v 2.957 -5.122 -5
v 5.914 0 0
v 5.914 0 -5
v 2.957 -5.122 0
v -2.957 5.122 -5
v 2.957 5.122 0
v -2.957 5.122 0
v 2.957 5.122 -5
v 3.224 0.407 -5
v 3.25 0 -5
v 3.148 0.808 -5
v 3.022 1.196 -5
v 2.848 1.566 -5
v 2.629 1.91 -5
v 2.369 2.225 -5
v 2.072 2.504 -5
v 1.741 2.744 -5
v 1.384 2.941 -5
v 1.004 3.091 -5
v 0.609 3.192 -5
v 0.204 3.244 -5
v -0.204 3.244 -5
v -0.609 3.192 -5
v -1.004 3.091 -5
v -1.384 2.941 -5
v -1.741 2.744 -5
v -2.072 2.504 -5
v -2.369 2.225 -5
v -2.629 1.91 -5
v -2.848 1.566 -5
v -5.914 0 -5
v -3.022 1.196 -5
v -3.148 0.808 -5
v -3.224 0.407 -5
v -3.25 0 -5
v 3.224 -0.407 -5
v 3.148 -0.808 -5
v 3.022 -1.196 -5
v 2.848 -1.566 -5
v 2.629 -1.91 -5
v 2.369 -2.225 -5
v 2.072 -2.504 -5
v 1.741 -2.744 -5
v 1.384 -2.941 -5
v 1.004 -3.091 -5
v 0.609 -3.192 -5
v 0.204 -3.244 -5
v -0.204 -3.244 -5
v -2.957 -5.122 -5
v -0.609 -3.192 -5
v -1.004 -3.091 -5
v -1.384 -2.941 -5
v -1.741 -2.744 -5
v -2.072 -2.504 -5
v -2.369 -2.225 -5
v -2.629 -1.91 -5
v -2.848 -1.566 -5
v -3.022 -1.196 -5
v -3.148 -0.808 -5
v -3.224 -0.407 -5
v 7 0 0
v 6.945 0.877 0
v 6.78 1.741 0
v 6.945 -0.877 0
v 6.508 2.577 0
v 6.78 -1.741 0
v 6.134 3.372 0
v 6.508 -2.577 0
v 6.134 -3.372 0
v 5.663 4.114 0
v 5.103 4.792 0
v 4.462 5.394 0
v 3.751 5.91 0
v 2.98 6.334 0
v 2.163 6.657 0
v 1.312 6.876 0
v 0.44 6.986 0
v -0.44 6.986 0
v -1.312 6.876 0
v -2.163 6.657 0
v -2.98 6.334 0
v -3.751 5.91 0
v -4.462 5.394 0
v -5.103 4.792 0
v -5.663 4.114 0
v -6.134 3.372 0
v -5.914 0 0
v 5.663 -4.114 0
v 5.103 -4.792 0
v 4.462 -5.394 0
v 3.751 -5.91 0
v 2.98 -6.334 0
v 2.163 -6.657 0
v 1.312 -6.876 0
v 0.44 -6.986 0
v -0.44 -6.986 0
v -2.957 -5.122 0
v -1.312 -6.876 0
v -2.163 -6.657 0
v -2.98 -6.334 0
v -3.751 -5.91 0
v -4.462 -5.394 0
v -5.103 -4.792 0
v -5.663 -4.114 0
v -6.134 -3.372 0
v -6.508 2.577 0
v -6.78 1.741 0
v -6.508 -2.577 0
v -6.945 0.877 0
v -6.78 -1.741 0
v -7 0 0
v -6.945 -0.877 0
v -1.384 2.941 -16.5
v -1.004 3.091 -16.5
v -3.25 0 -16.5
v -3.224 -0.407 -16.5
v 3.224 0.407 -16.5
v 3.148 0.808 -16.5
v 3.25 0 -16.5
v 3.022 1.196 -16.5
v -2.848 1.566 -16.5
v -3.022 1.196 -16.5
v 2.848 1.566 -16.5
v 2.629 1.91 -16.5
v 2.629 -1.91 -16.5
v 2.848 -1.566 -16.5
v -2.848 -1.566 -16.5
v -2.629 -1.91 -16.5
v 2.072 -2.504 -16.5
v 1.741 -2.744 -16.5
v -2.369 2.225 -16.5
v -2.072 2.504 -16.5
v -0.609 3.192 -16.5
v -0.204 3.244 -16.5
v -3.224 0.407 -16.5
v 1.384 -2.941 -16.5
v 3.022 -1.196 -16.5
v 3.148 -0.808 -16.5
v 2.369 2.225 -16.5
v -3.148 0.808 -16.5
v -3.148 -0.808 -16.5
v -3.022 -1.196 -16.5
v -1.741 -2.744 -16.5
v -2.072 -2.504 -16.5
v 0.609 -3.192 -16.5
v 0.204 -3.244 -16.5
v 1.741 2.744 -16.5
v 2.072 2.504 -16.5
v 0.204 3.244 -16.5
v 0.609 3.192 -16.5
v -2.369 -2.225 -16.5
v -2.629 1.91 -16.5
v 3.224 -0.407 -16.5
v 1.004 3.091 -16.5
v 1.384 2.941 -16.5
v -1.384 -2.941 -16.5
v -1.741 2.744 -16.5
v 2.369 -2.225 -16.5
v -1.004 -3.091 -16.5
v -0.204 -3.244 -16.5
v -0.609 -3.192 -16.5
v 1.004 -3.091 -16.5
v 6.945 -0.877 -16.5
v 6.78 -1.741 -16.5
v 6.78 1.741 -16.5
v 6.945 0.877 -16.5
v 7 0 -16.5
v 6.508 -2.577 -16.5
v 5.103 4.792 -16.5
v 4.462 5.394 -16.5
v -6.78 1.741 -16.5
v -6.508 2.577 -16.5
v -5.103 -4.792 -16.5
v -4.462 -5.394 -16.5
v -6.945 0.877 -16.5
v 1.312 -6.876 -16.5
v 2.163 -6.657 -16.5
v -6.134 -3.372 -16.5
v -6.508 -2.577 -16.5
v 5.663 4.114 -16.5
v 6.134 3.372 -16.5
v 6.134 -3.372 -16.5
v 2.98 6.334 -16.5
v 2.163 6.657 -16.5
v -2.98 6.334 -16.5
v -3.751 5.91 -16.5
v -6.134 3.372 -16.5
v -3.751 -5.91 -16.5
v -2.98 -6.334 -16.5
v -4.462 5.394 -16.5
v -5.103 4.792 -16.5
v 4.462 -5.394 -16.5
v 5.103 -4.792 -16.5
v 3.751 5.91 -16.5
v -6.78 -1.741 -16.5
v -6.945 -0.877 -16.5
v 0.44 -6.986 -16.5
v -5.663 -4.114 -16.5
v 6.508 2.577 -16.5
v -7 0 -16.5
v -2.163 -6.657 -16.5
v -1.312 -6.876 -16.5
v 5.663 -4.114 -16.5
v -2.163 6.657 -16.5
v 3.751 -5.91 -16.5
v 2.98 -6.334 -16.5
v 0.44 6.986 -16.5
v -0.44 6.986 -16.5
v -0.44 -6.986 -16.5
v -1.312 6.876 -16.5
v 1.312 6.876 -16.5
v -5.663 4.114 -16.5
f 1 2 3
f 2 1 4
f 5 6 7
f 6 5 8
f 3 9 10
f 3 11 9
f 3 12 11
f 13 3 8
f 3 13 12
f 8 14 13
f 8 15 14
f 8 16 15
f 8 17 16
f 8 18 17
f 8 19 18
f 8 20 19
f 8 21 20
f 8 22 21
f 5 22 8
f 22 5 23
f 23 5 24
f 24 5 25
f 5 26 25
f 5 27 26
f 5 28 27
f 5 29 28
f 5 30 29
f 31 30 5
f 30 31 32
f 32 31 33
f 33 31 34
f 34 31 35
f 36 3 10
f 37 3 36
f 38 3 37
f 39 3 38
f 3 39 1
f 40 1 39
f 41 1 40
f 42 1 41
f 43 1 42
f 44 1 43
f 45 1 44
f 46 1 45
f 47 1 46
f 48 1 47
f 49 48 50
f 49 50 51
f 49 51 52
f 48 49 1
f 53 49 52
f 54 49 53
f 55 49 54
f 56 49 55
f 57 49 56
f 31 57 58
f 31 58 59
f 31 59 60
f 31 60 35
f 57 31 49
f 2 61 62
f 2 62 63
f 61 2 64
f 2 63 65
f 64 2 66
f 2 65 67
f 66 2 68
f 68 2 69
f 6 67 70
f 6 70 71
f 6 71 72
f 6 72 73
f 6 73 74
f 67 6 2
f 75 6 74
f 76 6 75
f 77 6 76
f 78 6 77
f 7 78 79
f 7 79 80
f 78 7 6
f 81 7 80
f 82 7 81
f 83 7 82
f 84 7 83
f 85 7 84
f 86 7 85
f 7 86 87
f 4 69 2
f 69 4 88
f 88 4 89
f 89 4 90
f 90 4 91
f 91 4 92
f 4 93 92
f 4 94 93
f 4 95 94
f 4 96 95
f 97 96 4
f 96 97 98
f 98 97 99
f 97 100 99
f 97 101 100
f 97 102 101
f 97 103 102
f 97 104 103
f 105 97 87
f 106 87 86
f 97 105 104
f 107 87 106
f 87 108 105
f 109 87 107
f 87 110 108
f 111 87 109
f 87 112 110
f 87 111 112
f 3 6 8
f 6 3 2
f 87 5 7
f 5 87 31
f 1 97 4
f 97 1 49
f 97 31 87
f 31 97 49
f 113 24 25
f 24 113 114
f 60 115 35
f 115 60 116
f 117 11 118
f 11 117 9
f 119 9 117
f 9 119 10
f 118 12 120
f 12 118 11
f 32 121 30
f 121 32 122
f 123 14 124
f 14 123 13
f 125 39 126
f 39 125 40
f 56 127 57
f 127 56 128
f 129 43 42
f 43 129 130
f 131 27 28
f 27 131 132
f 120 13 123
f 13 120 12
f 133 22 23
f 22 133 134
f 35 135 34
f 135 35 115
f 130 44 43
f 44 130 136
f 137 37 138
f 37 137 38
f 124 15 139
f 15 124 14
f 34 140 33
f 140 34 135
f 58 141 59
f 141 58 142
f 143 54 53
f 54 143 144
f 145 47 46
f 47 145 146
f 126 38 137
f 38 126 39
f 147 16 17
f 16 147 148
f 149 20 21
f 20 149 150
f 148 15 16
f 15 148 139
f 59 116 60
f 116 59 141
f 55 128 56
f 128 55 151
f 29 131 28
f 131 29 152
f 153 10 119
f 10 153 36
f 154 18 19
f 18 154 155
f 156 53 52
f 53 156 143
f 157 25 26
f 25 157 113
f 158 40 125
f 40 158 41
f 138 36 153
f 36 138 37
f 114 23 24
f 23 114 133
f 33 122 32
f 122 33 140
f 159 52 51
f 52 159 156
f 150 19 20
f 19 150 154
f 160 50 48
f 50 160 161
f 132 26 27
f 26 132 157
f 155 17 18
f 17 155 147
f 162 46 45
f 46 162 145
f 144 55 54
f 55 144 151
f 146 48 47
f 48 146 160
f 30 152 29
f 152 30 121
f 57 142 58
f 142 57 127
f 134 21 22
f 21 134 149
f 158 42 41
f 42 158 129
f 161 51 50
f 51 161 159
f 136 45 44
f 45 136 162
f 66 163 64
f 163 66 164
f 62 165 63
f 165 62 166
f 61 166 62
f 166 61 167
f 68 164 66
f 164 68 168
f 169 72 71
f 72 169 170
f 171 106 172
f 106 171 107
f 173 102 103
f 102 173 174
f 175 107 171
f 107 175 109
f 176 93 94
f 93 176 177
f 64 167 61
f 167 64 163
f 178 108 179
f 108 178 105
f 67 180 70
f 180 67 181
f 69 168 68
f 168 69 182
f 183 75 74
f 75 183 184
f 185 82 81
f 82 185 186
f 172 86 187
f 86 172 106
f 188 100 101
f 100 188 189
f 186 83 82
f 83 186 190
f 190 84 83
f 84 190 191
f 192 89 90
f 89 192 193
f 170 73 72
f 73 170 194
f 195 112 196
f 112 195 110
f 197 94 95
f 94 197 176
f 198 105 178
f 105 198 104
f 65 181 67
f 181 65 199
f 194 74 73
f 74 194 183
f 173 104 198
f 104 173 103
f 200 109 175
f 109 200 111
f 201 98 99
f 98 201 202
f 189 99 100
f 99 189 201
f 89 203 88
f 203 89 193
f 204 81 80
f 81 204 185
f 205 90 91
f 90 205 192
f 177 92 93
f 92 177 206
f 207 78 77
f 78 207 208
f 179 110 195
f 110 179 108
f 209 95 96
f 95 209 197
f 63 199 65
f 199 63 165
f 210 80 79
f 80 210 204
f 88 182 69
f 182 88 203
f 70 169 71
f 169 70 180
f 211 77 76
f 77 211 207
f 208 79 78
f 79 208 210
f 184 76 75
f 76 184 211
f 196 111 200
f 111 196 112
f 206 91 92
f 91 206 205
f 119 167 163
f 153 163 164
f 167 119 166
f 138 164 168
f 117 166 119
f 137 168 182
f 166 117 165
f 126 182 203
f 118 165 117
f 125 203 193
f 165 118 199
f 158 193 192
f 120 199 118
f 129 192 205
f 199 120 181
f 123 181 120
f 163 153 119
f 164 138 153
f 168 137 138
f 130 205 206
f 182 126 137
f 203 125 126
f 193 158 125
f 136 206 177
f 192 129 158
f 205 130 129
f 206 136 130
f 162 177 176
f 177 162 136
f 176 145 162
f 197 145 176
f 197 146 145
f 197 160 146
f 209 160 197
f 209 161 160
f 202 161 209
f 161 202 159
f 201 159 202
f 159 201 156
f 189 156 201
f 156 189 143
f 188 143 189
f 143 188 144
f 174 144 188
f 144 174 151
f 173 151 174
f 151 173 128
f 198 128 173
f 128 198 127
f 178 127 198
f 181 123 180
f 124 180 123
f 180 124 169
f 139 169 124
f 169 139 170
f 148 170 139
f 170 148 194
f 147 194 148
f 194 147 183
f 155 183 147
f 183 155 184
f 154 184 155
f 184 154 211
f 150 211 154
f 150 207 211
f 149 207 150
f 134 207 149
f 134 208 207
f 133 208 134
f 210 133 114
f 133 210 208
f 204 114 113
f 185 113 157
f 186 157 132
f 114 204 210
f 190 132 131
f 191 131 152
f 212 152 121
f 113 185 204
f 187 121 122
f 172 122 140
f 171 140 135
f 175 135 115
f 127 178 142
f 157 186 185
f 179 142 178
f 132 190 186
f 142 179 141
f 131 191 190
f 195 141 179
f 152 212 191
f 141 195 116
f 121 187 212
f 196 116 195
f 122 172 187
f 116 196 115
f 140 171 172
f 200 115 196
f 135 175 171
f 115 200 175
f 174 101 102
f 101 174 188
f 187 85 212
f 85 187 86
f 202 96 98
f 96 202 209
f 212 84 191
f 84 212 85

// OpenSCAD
$fn = 50;


difference() {
	union() {
		translate(v = [0, 0, -16.5000000000]) {
			cylinder(h = 16.5000000000, r = 7.0000000000);
		}
	}
	union() {
		translate(v = [0, 0, 0]) {
			rotate(a = [0, 0, 0]) {
				difference() {
					union() {
						translate(v = [0, 0, -5]) {
							linear_extrude(height = 5) {
								polygon(points = [[5.9142500000, 0.0000000000], [2.9571250000, 5.1218907443], [-2.9571250000, 5.1218907443], [-5.9142500000, 0.0000000000], [-2.9571250000, -5.1218907443], [2.9571250000, -5.1218907443]]);
							}
						}
					}
					union();
				}
			}
		}
		#translate(v = [0, 0, -100.0000000000]) {
			cylinder(h = 200, r = 3.2500000000);
		}
	}
}
